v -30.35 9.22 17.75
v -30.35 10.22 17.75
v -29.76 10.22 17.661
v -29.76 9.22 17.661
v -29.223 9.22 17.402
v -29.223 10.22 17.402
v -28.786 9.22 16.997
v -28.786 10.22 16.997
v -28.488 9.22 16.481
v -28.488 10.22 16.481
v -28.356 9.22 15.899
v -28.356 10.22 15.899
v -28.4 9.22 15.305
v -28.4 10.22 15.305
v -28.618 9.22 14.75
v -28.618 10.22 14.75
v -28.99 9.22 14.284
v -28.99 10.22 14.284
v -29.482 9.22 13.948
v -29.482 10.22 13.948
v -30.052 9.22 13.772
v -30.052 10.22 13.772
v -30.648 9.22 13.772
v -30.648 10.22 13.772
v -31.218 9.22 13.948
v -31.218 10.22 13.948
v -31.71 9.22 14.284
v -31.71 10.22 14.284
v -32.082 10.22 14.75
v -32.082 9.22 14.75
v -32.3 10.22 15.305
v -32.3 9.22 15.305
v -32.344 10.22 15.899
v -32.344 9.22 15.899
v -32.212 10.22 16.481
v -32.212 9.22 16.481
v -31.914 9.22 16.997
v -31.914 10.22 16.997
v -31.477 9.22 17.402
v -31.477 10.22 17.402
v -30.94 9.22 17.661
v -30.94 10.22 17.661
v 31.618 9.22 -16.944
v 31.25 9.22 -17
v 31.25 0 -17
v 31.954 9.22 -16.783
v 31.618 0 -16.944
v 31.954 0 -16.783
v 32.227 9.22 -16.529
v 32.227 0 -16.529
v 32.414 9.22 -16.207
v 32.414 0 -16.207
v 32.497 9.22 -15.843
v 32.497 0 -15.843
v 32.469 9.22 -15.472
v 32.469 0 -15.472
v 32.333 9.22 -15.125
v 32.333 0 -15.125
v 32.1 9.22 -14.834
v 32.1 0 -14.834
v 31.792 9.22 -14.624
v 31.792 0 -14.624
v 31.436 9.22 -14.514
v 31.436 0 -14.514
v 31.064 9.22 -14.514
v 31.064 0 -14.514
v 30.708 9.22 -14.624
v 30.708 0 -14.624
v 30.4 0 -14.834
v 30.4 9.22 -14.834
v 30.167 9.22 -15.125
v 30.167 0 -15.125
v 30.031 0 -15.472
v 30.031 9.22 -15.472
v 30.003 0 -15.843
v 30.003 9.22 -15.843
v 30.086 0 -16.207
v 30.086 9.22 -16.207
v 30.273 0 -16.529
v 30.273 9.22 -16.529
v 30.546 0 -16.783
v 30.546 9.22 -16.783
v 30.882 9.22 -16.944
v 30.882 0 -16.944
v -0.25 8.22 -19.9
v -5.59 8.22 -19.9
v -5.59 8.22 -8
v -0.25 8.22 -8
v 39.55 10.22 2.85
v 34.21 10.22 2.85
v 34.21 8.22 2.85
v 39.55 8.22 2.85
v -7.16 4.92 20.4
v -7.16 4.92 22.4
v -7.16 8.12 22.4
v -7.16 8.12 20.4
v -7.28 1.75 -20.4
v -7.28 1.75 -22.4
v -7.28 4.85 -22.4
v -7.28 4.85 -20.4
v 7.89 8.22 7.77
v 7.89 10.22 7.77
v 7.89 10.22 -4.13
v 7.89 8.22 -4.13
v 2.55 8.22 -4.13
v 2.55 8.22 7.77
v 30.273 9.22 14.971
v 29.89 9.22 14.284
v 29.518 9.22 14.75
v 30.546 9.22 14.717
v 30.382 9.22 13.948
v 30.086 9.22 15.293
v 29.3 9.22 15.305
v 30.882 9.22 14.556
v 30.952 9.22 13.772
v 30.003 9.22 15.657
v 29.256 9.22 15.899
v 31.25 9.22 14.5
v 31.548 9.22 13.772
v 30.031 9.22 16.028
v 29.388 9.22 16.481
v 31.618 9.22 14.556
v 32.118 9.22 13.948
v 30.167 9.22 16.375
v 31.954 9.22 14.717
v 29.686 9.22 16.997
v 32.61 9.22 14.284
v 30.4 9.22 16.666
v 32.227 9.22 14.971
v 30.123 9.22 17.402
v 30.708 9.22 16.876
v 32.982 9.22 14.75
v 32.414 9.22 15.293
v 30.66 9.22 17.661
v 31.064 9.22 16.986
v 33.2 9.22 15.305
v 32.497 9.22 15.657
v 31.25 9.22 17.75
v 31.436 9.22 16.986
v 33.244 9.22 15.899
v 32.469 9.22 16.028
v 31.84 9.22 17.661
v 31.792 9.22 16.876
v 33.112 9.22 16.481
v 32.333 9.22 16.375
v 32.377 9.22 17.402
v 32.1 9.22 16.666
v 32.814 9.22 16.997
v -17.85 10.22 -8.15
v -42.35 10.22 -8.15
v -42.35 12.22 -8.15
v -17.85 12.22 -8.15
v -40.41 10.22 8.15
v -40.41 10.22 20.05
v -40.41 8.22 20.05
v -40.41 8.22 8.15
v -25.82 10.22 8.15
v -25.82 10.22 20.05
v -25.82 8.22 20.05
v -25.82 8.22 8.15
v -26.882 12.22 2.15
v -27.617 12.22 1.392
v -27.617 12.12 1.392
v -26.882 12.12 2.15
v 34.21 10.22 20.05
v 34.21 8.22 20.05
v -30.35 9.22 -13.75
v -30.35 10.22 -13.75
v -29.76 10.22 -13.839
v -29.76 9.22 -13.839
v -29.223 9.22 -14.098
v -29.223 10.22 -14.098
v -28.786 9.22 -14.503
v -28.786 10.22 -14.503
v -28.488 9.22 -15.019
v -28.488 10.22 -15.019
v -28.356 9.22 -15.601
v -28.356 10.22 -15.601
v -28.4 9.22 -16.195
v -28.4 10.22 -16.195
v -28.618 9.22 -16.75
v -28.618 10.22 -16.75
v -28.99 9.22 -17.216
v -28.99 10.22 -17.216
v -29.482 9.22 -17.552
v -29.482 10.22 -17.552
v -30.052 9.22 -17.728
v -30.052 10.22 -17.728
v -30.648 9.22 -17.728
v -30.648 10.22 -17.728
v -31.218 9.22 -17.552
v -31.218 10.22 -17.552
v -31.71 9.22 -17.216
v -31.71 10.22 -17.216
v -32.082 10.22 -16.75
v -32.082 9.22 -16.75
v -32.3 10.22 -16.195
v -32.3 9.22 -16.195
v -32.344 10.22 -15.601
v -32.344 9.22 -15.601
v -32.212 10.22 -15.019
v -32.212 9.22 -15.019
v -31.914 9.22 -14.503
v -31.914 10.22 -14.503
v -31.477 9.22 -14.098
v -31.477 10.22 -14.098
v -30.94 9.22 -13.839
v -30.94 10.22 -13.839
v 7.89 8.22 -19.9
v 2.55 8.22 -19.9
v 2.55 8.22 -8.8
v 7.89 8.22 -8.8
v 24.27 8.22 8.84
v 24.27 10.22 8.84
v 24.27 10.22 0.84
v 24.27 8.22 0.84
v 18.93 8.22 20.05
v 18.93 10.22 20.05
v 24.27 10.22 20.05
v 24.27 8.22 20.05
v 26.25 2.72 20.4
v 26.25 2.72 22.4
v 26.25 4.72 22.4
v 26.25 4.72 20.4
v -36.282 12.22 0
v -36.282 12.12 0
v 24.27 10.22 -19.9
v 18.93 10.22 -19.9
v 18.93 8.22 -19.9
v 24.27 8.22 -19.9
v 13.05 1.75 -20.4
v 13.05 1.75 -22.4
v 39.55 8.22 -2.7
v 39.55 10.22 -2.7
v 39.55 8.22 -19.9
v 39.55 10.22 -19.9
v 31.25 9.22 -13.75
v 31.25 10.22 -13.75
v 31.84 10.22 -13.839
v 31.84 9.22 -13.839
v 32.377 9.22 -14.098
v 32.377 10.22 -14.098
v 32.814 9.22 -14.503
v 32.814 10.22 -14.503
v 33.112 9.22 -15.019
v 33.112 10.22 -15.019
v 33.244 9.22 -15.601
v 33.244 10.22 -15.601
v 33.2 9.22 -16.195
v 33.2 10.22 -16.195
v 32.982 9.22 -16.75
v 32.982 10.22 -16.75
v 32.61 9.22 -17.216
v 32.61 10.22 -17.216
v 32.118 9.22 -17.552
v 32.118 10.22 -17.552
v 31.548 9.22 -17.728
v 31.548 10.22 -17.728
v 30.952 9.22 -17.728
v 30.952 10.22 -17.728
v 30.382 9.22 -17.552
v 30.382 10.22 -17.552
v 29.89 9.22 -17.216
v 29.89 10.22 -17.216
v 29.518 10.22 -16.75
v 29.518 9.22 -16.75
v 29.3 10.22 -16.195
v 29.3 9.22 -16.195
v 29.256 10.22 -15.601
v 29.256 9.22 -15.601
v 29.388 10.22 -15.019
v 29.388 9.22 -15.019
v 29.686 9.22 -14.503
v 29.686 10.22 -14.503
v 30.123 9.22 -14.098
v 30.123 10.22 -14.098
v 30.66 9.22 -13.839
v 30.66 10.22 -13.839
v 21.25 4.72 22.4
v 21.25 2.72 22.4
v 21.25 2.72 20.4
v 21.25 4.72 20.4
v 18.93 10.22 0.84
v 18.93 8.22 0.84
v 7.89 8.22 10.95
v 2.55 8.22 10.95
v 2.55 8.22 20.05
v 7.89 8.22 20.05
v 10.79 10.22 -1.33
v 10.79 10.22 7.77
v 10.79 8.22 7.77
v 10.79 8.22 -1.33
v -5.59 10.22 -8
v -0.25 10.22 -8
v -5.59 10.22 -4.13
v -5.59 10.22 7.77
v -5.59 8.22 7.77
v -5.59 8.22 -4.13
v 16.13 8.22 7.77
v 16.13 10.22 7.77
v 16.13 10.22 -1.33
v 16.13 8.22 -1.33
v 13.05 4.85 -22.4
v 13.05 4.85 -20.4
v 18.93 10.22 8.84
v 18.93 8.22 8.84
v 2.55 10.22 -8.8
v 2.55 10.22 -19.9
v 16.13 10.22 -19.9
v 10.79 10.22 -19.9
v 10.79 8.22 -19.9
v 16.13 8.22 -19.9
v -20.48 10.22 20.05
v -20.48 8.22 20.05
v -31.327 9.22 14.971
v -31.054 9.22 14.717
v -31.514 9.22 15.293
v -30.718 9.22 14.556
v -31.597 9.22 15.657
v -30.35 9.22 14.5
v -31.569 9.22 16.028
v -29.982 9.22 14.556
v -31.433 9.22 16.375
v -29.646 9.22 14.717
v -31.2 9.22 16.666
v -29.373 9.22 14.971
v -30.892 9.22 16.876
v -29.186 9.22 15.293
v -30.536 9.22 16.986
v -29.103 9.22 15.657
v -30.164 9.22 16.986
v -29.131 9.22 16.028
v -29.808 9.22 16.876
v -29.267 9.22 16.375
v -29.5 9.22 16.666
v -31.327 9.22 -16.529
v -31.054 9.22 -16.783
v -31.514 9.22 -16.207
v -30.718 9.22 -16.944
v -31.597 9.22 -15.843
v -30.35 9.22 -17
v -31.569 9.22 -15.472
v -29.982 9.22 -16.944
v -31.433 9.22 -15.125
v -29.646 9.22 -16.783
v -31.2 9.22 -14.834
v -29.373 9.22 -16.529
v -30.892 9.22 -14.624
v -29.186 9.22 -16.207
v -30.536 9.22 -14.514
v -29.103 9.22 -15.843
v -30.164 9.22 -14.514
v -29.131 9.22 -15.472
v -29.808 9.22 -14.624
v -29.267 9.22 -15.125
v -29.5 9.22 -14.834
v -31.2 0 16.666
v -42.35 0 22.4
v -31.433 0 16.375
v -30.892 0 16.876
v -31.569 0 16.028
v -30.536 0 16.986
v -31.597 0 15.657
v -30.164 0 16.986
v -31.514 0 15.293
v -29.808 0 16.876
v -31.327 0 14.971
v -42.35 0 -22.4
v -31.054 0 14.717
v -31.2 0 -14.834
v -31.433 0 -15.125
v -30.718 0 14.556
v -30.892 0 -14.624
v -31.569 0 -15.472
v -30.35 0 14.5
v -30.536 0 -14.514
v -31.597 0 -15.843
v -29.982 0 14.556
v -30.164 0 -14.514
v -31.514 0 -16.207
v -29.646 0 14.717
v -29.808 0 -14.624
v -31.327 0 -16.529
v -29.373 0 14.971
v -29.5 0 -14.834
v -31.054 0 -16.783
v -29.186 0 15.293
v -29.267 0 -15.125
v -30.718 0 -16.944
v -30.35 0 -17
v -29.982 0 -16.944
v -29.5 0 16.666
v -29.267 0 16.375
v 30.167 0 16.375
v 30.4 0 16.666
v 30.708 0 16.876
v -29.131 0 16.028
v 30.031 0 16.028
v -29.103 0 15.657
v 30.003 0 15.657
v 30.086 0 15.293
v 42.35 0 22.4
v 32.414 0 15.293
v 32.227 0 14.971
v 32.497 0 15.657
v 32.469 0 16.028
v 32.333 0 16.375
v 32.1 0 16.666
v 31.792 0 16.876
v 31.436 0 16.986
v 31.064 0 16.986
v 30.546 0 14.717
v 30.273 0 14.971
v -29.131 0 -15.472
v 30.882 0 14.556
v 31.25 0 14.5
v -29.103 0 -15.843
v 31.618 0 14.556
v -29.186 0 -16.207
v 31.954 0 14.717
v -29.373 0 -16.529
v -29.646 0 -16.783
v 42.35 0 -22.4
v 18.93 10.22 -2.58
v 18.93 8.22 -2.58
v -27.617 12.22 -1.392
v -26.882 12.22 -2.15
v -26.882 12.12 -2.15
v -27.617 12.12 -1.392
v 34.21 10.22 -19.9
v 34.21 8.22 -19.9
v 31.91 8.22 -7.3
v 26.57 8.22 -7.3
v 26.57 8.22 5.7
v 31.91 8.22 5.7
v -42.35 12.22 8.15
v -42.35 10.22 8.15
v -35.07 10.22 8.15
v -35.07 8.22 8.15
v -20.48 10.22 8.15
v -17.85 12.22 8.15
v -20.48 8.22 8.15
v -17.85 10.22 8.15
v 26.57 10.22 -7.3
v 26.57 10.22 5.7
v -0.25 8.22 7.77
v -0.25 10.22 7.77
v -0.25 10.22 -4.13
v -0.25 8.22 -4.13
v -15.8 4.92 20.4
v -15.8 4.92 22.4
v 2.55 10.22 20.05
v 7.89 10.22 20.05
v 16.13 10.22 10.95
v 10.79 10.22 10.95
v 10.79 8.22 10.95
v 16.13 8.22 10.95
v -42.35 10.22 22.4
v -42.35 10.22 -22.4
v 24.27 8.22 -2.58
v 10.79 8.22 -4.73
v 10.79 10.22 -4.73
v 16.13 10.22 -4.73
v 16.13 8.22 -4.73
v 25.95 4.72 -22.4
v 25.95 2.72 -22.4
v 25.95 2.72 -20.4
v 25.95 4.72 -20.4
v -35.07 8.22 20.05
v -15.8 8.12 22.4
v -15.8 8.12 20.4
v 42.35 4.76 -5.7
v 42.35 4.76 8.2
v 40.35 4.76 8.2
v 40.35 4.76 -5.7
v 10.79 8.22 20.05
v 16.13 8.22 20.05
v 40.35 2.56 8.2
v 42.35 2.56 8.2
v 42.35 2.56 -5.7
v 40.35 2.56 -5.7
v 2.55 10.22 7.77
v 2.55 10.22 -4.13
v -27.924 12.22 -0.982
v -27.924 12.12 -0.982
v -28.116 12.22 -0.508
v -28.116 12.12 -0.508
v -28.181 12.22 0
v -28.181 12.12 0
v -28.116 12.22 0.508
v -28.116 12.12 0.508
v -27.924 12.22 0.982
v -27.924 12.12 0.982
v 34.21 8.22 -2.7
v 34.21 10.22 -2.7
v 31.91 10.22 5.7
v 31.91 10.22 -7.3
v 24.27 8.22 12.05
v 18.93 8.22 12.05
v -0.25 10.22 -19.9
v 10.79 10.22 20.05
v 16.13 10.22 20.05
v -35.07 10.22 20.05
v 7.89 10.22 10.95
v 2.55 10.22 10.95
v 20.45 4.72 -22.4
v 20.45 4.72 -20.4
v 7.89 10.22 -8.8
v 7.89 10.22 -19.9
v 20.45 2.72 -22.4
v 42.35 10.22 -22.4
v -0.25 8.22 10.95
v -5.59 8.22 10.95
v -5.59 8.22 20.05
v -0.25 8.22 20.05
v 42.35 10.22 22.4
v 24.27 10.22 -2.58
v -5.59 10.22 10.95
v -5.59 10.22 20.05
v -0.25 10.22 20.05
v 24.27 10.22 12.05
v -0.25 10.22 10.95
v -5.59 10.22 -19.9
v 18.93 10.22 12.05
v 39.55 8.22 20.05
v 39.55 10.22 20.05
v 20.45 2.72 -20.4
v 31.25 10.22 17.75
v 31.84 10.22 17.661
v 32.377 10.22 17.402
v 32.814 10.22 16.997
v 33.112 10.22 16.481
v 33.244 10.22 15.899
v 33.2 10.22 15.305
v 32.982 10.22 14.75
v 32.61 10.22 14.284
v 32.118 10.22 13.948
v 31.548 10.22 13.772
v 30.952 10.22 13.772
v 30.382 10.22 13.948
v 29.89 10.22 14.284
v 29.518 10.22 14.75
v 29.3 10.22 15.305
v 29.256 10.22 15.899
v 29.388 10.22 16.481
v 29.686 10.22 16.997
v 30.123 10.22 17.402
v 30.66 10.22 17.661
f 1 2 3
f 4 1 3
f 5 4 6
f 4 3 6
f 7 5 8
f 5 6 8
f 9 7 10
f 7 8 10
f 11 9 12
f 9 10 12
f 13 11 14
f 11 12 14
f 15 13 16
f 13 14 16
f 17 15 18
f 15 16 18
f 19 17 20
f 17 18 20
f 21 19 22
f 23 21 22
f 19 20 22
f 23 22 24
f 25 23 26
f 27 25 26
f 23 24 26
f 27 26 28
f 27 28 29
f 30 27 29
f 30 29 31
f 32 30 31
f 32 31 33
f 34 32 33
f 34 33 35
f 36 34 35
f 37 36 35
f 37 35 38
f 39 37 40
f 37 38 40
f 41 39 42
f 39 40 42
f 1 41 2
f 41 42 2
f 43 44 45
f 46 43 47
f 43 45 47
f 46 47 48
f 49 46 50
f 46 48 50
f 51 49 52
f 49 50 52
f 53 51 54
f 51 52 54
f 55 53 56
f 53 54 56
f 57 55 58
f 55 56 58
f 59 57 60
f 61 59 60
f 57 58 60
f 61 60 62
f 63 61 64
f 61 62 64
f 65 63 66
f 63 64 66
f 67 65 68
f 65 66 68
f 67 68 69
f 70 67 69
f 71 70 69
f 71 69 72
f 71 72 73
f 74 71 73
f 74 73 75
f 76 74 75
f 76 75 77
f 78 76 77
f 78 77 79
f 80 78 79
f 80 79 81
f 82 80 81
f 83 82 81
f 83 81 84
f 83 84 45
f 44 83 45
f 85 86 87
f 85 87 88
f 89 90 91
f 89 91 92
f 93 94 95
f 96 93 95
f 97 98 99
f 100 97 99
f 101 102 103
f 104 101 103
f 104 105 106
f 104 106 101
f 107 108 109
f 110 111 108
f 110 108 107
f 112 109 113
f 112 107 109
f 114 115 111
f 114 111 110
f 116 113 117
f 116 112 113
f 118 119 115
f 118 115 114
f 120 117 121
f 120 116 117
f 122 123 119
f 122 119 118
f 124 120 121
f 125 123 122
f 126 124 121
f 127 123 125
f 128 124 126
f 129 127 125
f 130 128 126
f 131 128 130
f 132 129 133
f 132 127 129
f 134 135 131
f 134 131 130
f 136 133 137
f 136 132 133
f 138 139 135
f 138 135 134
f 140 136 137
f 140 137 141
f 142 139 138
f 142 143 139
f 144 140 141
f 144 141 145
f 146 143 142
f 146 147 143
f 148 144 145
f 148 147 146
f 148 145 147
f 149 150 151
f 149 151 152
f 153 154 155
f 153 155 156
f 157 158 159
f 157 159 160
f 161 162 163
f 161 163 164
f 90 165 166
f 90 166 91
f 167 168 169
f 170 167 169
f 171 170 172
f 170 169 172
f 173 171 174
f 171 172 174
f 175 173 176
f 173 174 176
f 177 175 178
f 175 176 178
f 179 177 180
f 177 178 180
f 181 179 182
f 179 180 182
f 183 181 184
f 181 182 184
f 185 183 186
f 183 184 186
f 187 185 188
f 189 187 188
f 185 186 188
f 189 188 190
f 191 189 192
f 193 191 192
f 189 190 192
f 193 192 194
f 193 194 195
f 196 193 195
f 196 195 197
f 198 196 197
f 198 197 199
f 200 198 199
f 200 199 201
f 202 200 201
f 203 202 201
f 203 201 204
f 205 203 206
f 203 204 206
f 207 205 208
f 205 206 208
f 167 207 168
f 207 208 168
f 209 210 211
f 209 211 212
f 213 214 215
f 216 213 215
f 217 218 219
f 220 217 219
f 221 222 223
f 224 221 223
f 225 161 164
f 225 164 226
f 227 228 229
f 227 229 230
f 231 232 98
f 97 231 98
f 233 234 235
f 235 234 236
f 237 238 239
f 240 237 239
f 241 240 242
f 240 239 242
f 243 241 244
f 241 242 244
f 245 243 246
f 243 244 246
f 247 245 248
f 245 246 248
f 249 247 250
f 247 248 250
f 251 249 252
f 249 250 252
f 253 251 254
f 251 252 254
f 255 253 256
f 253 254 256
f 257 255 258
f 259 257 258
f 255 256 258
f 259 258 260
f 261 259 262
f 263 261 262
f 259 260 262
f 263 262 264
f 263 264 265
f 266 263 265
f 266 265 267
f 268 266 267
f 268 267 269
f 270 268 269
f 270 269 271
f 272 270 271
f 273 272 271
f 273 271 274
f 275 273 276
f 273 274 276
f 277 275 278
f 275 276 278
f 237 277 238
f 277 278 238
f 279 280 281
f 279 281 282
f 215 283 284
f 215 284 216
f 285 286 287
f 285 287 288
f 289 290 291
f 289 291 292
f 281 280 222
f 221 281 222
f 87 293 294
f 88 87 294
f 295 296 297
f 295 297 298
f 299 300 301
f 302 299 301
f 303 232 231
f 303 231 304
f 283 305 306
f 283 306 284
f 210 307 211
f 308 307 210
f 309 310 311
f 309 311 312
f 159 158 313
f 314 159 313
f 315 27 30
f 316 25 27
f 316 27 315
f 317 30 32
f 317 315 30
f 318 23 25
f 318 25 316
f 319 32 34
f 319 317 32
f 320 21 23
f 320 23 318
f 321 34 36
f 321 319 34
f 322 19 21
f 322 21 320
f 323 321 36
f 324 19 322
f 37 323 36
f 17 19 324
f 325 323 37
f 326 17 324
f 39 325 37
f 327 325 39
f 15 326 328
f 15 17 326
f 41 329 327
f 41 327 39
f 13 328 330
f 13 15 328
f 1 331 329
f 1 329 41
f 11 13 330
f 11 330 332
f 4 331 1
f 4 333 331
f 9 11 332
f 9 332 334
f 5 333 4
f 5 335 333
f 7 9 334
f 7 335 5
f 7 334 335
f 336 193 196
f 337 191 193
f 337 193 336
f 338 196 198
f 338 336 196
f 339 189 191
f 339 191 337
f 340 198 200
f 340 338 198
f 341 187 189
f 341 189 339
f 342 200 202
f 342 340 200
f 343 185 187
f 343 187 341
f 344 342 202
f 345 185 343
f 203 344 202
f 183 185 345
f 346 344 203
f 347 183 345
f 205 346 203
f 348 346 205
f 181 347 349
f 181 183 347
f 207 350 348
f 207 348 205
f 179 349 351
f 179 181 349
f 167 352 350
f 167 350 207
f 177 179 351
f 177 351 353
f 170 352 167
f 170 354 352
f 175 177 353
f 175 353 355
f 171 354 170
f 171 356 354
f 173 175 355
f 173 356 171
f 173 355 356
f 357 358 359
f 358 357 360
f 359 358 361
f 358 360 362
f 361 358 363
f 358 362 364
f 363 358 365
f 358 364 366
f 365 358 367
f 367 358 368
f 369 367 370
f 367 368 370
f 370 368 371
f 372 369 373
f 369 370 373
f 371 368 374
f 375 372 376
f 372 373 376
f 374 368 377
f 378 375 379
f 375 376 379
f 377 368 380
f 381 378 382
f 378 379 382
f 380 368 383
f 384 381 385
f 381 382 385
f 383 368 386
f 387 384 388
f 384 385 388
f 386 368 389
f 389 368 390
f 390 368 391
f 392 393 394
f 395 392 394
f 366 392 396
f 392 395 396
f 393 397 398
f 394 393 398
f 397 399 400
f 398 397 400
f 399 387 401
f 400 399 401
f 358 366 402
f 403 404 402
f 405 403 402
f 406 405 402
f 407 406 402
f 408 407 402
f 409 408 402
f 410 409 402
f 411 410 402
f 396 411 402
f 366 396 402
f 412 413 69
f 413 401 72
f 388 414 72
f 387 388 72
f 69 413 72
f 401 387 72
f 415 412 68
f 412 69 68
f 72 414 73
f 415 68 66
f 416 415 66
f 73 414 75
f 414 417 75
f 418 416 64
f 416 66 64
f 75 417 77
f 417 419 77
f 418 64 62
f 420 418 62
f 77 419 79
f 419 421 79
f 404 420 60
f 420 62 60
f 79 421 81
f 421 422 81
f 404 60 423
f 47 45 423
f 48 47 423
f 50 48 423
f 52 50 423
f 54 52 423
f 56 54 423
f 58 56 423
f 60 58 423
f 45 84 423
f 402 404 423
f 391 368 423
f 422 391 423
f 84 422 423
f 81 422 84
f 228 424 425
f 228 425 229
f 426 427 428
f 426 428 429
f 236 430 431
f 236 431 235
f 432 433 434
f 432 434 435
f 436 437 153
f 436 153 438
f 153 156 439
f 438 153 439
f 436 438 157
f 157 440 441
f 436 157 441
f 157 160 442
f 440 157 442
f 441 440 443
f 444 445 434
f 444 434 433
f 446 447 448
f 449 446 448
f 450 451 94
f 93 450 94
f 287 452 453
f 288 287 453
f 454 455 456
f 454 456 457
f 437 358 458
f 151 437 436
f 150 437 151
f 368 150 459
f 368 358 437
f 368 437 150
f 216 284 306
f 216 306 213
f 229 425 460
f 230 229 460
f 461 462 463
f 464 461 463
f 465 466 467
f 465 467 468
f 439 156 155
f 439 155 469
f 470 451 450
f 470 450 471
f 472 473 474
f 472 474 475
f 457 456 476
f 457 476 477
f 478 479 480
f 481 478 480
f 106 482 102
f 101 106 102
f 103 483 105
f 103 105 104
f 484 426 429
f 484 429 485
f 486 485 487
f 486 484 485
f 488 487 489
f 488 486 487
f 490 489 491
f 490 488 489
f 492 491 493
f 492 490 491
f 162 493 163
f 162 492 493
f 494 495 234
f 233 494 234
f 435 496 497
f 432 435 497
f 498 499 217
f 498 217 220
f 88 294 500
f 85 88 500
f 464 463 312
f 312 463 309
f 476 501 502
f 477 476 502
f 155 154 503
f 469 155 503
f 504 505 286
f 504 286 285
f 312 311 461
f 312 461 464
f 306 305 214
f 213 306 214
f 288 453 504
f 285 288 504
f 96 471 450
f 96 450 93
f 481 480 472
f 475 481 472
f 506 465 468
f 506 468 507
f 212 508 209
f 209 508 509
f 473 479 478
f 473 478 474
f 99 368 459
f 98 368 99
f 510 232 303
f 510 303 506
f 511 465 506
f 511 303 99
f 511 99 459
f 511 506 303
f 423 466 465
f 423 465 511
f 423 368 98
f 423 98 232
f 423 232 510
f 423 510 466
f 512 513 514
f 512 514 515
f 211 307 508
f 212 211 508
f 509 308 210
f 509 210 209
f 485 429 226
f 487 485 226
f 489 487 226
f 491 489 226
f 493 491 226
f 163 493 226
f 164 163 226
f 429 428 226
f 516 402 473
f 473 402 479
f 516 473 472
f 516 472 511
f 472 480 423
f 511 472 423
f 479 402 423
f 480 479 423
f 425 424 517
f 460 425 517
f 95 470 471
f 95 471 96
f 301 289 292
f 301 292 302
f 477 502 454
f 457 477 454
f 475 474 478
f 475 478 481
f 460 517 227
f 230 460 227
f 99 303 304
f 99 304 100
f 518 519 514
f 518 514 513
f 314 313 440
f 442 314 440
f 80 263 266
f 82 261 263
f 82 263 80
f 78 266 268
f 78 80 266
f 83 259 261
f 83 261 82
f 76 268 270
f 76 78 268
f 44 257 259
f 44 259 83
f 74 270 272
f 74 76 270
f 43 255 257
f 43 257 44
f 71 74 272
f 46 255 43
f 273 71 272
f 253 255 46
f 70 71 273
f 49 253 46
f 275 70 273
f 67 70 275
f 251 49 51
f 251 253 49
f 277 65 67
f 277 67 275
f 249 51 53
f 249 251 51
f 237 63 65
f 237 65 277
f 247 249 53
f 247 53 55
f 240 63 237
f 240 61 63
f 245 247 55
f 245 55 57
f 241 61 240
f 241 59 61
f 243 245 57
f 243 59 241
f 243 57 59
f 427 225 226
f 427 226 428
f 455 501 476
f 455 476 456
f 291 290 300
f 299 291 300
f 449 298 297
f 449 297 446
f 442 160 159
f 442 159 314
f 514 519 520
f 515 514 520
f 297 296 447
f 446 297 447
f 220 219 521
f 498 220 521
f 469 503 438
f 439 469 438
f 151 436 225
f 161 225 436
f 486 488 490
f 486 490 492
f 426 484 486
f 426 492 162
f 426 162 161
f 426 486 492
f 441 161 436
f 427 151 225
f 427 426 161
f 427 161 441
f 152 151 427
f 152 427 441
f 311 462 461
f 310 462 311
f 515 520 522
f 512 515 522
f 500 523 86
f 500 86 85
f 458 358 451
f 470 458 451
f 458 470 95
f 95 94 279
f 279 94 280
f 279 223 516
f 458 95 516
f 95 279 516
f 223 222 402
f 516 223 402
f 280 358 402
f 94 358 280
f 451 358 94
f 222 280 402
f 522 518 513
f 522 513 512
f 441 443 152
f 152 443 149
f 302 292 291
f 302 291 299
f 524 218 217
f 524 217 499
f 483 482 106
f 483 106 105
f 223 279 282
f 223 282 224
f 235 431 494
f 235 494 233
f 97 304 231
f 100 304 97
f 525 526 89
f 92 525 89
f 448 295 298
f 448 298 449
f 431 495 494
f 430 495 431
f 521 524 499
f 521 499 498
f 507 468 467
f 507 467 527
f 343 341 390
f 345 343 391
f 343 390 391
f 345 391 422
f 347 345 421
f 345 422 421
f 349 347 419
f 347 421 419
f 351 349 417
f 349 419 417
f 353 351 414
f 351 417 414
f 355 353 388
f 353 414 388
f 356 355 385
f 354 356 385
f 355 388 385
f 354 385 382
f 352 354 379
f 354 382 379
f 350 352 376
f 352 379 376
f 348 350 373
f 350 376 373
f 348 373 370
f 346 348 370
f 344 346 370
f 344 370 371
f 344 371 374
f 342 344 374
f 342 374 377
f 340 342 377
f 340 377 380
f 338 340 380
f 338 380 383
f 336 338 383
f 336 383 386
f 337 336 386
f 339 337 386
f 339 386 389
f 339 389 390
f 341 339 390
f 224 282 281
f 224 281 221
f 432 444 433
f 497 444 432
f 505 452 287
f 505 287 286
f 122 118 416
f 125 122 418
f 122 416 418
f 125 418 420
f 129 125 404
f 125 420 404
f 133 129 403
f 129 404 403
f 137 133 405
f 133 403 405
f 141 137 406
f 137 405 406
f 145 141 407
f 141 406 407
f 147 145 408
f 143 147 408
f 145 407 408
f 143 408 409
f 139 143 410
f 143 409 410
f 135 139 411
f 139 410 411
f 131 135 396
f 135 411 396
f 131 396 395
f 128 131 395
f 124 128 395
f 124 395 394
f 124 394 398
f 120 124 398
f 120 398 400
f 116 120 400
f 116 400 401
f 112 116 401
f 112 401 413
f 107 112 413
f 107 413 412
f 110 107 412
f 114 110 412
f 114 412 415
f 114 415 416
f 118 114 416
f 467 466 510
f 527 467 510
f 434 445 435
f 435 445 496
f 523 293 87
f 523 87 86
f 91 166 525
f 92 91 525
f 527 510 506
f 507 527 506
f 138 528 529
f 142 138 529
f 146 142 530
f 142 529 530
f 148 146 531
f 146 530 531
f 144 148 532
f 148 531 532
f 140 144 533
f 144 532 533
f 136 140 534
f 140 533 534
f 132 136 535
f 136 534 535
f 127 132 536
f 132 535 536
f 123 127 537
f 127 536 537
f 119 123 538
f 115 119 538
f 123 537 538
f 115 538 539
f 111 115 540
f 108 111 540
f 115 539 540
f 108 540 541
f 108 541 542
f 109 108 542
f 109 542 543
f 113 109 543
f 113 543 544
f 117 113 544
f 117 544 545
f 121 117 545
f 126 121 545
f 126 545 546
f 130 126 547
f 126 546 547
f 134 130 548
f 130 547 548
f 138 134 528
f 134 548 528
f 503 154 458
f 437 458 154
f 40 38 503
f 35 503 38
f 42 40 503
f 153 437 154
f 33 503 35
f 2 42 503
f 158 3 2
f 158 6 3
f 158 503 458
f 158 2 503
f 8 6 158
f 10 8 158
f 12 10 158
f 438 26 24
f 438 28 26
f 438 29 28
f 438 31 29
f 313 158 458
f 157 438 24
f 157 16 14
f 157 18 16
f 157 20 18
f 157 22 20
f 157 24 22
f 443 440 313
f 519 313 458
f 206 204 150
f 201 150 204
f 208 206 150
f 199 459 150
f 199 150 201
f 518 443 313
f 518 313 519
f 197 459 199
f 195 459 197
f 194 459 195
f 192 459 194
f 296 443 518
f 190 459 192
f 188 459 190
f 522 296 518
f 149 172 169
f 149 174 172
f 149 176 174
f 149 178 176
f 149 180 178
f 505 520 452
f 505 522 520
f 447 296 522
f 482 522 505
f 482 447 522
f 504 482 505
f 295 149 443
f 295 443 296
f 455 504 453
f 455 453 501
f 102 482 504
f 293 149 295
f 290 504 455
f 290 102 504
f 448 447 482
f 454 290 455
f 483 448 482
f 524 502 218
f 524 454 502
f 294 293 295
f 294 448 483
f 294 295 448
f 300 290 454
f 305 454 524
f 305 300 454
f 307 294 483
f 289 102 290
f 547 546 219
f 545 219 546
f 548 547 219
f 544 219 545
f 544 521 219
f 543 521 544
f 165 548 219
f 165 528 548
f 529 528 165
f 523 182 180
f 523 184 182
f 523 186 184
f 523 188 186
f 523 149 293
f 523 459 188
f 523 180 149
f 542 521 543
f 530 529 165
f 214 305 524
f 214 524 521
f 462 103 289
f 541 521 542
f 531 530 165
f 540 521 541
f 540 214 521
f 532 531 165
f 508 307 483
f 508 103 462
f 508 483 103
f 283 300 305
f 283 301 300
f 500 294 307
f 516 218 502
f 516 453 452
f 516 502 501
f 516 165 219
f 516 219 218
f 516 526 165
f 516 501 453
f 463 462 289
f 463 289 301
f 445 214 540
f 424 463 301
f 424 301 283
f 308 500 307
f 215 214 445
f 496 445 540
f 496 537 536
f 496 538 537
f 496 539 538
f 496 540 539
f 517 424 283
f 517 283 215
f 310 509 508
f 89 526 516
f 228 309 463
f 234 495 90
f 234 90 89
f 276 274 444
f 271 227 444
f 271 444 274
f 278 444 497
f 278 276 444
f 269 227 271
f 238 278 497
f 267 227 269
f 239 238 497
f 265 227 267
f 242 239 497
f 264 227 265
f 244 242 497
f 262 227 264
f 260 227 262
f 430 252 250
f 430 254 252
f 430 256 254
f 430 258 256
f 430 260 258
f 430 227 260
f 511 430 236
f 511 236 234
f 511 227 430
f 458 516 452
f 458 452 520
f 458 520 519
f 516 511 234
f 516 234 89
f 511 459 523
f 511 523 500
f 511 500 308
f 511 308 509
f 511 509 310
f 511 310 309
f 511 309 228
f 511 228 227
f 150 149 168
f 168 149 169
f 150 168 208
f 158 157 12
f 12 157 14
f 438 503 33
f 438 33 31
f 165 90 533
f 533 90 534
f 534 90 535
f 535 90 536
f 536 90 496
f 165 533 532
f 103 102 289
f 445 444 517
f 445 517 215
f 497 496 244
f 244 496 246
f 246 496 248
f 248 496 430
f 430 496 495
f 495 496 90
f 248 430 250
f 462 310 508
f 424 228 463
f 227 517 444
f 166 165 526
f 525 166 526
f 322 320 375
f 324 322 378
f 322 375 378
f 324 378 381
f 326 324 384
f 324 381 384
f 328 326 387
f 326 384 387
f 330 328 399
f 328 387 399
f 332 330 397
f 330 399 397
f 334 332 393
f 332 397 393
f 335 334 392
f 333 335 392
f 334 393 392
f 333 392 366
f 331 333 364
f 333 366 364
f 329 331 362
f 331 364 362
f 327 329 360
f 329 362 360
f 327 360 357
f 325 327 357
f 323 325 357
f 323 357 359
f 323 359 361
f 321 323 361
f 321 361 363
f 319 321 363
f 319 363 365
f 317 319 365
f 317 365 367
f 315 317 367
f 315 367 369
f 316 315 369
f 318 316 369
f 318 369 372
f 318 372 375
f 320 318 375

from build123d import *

# Parameters (mm, degrees)
SKETCH1_W           = 84.7
SKETCH1_H           = 44.8
BOSS_EXTRUDE1_DEPTH = 10.22
SKETCH2_W           = 24.5
SKETCH2_H           = 16.3
BOSS_EXTRUDE2_DEPTH = 2
SKETCH3_W           = 5.34
SKETCH3_H           = 9.1
SKETCH3_H_2         = 11.9
SKETCH3_H_3         = 11.1
SKETCH3_H_4         = 15.17
SKETCH3_H_5         = 17.32
SKETCH3_H_6         = 8
SKETCH3_H_7         = 13
SKETCH3_H_8         = 17.2
CUT_EXTRUDE1_DEPTH  = 2
SKETCH4_R           = 1.25
CUT_EXTRUDE2_DEPTH  = 50.443006583
SKETCH5_R           = 2
CUT_EXTRUDE3_DEPTH  = 1
SKETCH7_W           = 8.64
SKETCH7_H           = 3.2
CUT_EXTRUDE5_DEPTH  = 2
SKETCH8_W           = 5
SKETCH8_H           = 2
CUT_EXTRUDE6_DEPTH  = 2
SKETCH9_W           = 20.33
SKETCH9_H           = 3.1
SKETCH9_W_2         = 5.5
SKETCH9_H_2         = 2
CUT_EXTRUDE7_DEPTH  = 2
SKETCH10_W          = 13.9
SKETCH10_H          = 2.2
CUT_EXTRUDE8_DEPTH  = 2
CUT_EXTRUDE9_DEPTH  = 0.1


with BuildPart() as part:
    # Sketch1 → Boss-Extrude1 (new body)
    with BuildSketch(Plane(origin=(0, 0, 0), x_dir=(1, 0, 0), z_dir=(0, 1, 0))):
        Rectangle(SKETCH1_W, SKETCH1_H)
    extrude(amount=BOSS_EXTRUDE1_DEPTH)

    # Sketch2 → Boss-Extrude2 (add)
    with BuildSketch(Plane(origin=(0, 10.22, 0), x_dir=(1, 0, 0), z_dir=(0, 1, 0))):
        with Locations((-30.1, 0)):
            Rectangle(SKETCH2_W, SKETCH2_H)
    extrude(amount=BOSS_EXTRUDE2_DEPTH)

    # Sketch3 → Cut-Extrude1 (cut)
    with BuildSketch(Plane(origin=(0, 10.22, 0), x_dir=(1, 0, 0), z_dir=(0, 1, 0))):
        with Locations((-2.92, -15.5)):
            Rectangle(SKETCH3_W, SKETCH3_H)
        with Locations((-2.92, -1.82)):
            Rectangle(SKETCH3_W, SKETCH3_H_2)
        with Locations((-2.92, 13.95)):
            Rectangle(SKETCH3_W, SKETCH3_H_2)
        with Locations((5.22, 14.35)):
            Rectangle(SKETCH3_W, SKETCH3_H_3)
        with Locations((5.22, -1.82)):
            Rectangle(SKETCH3_W, SKETCH3_H_2)
        with Locations((5.22, -15.5)):
            Rectangle(SKETCH3_W, SKETCH3_H)
        with Locations((13.46, -15.5)):
            Rectangle(SKETCH3_W, SKETCH3_H)
        with Locations((13.46, -3.22)):
            Rectangle(SKETCH3_W, SKETCH3_H)
        with Locations((13.46, 12.315)):
            Rectangle(SKETCH3_W, SKETCH3_H_4)
        with Locations((21.6, 11.24)):
            Rectangle(SKETCH3_W, SKETCH3_H_5)
        with Locations((21.6, -4.84)):
            Rectangle(SKETCH3_W, SKETCH3_H_6)
        with Locations((21.6, -16.05)):
            Rectangle(SKETCH3_W, SKETCH3_H_6)
        with Locations((29.24, 0.8)):
            Rectangle(SKETCH3_W, SKETCH3_H_7)
        with Locations((36.88, 11.3)):
            Rectangle(SKETCH3_W, SKETCH3_H_8)
        with Locations((36.88, -11.45)):
            Rectangle(SKETCH3_W, SKETCH3_H_8)
        with Locations((-37.74, -14.1)):
            Rectangle(SKETCH3_W, SKETCH3_H_2)
        with Locations((-23.15, -14.1)):
            Rectangle(SKETCH3_W, SKETCH3_H_2)
    extrude(amount=-CUT_EXTRUDE1_DEPTH, mode=Mode.SUBTRACT)

    # Sketch4 → Cut-Extrude2 (cut, through all)
    with BuildSketch(Plane.XZ):
        with Locations(Location((-30.35, 15.75, 0), (0, 0, 270))):
            Circle(SKETCH4_R)
        with Locations(Location((-30.35, -15.75, 0), (0, 0, 270))):
            Circle(SKETCH4_R)
        with Locations(Location((31.25, 15.75, 0), (0, 0, 270))):
            Circle(SKETCH4_R)
        with Locations(Location((31.25, -15.75, 0), (0, 0, 270))):
            Circle(SKETCH4_R)
    extrude(amount=-CUT_EXTRUDE2_DEPTH, mode=Mode.SUBTRACT)

    # Sketch5 → Cut-Extrude3 (cut)
    with BuildSketch(Plane(origin=(0, 10.22, 0), x_dir=(1, 0, 0), z_dir=(0, 1, 0))):
        with Locations(Location((-30.35, -15.75, 0), (0, 0, 270))):
            Circle(SKETCH5_R)
        with Locations(Location((31.25, 15.75, 0), (0, 0, 270))):
            Circle(SKETCH5_R)
        with Locations(Location((31.25, -15.75, 0), (0, 0, 270))):
            Circle(SKETCH5_R)
        with Locations(Location((-30.35, 15.75, 0), (0, 0, 270))):
            Circle(SKETCH5_R)
    extrude(amount=-CUT_EXTRUDE3_DEPTH, mode=Mode.SUBTRACT)

    # Sketch7 → Cut-Extrude5 (cut)
    with BuildSketch(Plane.XY.offset(22.4)):
        with Locations((-11.48, 6.52)):
            Rectangle(SKETCH7_W, SKETCH7_H)
    extrude(amount=-CUT_EXTRUDE5_DEPTH, mode=Mode.SUBTRACT)

    # Sketch8 → Cut-Extrude6 (cut)
    with BuildSketch(Plane.XY.offset(22.4)):
        with Locations((23.75, 3.72)):
            Rectangle(SKETCH8_W, SKETCH8_H)
    extrude(amount=-CUT_EXTRUDE6_DEPTH, mode=Mode.SUBTRACT)

    # Sketch9 → Cut-Extrude7 (cut)
    with BuildSketch(Plane(origin=(0, 0, -22.4), x_dir=(-1, 0, 0), z_dir=(0, 0, -1))):
        with Locations((-2.885, 3.3)):
            Rectangle(SKETCH9_W, SKETCH9_H)
        with Locations((-23.2, 3.72)):
            Rectangle(SKETCH9_W_2, SKETCH9_H_2)
    extrude(amount=-CUT_EXTRUDE7_DEPTH, mode=Mode.SUBTRACT)

    # Sketch10 → Cut-Extrude8 (cut)
    with BuildSketch(Plane(origin=(42.35, 0, 0), x_dir=(0, 0, -1), z_dir=(1, 0, 0))):
        with Locations((-1.25, 3.66)):
            Rectangle(SKETCH10_W, SKETCH10_H)
    extrude(amount=-CUT_EXTRUDE8_DEPTH, mode=Mode.SUBTRACT)

    # Sketch11 → Cut-Extrude9 (cut)
    with BuildSketch(Plane(origin=(0, 12.22, 0), x_dir=(1, 0, 0), z_dir=(0, 1, 0))):
        with BuildLine():
            Line((-36.282417149, 0), (-26.882417149, 2.15))
            Line((-26.882417149, 2.15), (-27.617159632, 1.392199815))
            ThreePointArc((-27.617159632, 1.392199815), (-28.181269776, 0), (-27.617159632, -1.392199815))
            Line((-27.617159632, -1.392199815), (-26.882417149, -2.15))
            Line((-26.882417149, -2.15), (-36.282417149, 0))
        make_face()
    extrude(amount=-CUT_EXTRUDE9_DEPTH, mode=Mode.SUBTRACT)


solid = part.part
